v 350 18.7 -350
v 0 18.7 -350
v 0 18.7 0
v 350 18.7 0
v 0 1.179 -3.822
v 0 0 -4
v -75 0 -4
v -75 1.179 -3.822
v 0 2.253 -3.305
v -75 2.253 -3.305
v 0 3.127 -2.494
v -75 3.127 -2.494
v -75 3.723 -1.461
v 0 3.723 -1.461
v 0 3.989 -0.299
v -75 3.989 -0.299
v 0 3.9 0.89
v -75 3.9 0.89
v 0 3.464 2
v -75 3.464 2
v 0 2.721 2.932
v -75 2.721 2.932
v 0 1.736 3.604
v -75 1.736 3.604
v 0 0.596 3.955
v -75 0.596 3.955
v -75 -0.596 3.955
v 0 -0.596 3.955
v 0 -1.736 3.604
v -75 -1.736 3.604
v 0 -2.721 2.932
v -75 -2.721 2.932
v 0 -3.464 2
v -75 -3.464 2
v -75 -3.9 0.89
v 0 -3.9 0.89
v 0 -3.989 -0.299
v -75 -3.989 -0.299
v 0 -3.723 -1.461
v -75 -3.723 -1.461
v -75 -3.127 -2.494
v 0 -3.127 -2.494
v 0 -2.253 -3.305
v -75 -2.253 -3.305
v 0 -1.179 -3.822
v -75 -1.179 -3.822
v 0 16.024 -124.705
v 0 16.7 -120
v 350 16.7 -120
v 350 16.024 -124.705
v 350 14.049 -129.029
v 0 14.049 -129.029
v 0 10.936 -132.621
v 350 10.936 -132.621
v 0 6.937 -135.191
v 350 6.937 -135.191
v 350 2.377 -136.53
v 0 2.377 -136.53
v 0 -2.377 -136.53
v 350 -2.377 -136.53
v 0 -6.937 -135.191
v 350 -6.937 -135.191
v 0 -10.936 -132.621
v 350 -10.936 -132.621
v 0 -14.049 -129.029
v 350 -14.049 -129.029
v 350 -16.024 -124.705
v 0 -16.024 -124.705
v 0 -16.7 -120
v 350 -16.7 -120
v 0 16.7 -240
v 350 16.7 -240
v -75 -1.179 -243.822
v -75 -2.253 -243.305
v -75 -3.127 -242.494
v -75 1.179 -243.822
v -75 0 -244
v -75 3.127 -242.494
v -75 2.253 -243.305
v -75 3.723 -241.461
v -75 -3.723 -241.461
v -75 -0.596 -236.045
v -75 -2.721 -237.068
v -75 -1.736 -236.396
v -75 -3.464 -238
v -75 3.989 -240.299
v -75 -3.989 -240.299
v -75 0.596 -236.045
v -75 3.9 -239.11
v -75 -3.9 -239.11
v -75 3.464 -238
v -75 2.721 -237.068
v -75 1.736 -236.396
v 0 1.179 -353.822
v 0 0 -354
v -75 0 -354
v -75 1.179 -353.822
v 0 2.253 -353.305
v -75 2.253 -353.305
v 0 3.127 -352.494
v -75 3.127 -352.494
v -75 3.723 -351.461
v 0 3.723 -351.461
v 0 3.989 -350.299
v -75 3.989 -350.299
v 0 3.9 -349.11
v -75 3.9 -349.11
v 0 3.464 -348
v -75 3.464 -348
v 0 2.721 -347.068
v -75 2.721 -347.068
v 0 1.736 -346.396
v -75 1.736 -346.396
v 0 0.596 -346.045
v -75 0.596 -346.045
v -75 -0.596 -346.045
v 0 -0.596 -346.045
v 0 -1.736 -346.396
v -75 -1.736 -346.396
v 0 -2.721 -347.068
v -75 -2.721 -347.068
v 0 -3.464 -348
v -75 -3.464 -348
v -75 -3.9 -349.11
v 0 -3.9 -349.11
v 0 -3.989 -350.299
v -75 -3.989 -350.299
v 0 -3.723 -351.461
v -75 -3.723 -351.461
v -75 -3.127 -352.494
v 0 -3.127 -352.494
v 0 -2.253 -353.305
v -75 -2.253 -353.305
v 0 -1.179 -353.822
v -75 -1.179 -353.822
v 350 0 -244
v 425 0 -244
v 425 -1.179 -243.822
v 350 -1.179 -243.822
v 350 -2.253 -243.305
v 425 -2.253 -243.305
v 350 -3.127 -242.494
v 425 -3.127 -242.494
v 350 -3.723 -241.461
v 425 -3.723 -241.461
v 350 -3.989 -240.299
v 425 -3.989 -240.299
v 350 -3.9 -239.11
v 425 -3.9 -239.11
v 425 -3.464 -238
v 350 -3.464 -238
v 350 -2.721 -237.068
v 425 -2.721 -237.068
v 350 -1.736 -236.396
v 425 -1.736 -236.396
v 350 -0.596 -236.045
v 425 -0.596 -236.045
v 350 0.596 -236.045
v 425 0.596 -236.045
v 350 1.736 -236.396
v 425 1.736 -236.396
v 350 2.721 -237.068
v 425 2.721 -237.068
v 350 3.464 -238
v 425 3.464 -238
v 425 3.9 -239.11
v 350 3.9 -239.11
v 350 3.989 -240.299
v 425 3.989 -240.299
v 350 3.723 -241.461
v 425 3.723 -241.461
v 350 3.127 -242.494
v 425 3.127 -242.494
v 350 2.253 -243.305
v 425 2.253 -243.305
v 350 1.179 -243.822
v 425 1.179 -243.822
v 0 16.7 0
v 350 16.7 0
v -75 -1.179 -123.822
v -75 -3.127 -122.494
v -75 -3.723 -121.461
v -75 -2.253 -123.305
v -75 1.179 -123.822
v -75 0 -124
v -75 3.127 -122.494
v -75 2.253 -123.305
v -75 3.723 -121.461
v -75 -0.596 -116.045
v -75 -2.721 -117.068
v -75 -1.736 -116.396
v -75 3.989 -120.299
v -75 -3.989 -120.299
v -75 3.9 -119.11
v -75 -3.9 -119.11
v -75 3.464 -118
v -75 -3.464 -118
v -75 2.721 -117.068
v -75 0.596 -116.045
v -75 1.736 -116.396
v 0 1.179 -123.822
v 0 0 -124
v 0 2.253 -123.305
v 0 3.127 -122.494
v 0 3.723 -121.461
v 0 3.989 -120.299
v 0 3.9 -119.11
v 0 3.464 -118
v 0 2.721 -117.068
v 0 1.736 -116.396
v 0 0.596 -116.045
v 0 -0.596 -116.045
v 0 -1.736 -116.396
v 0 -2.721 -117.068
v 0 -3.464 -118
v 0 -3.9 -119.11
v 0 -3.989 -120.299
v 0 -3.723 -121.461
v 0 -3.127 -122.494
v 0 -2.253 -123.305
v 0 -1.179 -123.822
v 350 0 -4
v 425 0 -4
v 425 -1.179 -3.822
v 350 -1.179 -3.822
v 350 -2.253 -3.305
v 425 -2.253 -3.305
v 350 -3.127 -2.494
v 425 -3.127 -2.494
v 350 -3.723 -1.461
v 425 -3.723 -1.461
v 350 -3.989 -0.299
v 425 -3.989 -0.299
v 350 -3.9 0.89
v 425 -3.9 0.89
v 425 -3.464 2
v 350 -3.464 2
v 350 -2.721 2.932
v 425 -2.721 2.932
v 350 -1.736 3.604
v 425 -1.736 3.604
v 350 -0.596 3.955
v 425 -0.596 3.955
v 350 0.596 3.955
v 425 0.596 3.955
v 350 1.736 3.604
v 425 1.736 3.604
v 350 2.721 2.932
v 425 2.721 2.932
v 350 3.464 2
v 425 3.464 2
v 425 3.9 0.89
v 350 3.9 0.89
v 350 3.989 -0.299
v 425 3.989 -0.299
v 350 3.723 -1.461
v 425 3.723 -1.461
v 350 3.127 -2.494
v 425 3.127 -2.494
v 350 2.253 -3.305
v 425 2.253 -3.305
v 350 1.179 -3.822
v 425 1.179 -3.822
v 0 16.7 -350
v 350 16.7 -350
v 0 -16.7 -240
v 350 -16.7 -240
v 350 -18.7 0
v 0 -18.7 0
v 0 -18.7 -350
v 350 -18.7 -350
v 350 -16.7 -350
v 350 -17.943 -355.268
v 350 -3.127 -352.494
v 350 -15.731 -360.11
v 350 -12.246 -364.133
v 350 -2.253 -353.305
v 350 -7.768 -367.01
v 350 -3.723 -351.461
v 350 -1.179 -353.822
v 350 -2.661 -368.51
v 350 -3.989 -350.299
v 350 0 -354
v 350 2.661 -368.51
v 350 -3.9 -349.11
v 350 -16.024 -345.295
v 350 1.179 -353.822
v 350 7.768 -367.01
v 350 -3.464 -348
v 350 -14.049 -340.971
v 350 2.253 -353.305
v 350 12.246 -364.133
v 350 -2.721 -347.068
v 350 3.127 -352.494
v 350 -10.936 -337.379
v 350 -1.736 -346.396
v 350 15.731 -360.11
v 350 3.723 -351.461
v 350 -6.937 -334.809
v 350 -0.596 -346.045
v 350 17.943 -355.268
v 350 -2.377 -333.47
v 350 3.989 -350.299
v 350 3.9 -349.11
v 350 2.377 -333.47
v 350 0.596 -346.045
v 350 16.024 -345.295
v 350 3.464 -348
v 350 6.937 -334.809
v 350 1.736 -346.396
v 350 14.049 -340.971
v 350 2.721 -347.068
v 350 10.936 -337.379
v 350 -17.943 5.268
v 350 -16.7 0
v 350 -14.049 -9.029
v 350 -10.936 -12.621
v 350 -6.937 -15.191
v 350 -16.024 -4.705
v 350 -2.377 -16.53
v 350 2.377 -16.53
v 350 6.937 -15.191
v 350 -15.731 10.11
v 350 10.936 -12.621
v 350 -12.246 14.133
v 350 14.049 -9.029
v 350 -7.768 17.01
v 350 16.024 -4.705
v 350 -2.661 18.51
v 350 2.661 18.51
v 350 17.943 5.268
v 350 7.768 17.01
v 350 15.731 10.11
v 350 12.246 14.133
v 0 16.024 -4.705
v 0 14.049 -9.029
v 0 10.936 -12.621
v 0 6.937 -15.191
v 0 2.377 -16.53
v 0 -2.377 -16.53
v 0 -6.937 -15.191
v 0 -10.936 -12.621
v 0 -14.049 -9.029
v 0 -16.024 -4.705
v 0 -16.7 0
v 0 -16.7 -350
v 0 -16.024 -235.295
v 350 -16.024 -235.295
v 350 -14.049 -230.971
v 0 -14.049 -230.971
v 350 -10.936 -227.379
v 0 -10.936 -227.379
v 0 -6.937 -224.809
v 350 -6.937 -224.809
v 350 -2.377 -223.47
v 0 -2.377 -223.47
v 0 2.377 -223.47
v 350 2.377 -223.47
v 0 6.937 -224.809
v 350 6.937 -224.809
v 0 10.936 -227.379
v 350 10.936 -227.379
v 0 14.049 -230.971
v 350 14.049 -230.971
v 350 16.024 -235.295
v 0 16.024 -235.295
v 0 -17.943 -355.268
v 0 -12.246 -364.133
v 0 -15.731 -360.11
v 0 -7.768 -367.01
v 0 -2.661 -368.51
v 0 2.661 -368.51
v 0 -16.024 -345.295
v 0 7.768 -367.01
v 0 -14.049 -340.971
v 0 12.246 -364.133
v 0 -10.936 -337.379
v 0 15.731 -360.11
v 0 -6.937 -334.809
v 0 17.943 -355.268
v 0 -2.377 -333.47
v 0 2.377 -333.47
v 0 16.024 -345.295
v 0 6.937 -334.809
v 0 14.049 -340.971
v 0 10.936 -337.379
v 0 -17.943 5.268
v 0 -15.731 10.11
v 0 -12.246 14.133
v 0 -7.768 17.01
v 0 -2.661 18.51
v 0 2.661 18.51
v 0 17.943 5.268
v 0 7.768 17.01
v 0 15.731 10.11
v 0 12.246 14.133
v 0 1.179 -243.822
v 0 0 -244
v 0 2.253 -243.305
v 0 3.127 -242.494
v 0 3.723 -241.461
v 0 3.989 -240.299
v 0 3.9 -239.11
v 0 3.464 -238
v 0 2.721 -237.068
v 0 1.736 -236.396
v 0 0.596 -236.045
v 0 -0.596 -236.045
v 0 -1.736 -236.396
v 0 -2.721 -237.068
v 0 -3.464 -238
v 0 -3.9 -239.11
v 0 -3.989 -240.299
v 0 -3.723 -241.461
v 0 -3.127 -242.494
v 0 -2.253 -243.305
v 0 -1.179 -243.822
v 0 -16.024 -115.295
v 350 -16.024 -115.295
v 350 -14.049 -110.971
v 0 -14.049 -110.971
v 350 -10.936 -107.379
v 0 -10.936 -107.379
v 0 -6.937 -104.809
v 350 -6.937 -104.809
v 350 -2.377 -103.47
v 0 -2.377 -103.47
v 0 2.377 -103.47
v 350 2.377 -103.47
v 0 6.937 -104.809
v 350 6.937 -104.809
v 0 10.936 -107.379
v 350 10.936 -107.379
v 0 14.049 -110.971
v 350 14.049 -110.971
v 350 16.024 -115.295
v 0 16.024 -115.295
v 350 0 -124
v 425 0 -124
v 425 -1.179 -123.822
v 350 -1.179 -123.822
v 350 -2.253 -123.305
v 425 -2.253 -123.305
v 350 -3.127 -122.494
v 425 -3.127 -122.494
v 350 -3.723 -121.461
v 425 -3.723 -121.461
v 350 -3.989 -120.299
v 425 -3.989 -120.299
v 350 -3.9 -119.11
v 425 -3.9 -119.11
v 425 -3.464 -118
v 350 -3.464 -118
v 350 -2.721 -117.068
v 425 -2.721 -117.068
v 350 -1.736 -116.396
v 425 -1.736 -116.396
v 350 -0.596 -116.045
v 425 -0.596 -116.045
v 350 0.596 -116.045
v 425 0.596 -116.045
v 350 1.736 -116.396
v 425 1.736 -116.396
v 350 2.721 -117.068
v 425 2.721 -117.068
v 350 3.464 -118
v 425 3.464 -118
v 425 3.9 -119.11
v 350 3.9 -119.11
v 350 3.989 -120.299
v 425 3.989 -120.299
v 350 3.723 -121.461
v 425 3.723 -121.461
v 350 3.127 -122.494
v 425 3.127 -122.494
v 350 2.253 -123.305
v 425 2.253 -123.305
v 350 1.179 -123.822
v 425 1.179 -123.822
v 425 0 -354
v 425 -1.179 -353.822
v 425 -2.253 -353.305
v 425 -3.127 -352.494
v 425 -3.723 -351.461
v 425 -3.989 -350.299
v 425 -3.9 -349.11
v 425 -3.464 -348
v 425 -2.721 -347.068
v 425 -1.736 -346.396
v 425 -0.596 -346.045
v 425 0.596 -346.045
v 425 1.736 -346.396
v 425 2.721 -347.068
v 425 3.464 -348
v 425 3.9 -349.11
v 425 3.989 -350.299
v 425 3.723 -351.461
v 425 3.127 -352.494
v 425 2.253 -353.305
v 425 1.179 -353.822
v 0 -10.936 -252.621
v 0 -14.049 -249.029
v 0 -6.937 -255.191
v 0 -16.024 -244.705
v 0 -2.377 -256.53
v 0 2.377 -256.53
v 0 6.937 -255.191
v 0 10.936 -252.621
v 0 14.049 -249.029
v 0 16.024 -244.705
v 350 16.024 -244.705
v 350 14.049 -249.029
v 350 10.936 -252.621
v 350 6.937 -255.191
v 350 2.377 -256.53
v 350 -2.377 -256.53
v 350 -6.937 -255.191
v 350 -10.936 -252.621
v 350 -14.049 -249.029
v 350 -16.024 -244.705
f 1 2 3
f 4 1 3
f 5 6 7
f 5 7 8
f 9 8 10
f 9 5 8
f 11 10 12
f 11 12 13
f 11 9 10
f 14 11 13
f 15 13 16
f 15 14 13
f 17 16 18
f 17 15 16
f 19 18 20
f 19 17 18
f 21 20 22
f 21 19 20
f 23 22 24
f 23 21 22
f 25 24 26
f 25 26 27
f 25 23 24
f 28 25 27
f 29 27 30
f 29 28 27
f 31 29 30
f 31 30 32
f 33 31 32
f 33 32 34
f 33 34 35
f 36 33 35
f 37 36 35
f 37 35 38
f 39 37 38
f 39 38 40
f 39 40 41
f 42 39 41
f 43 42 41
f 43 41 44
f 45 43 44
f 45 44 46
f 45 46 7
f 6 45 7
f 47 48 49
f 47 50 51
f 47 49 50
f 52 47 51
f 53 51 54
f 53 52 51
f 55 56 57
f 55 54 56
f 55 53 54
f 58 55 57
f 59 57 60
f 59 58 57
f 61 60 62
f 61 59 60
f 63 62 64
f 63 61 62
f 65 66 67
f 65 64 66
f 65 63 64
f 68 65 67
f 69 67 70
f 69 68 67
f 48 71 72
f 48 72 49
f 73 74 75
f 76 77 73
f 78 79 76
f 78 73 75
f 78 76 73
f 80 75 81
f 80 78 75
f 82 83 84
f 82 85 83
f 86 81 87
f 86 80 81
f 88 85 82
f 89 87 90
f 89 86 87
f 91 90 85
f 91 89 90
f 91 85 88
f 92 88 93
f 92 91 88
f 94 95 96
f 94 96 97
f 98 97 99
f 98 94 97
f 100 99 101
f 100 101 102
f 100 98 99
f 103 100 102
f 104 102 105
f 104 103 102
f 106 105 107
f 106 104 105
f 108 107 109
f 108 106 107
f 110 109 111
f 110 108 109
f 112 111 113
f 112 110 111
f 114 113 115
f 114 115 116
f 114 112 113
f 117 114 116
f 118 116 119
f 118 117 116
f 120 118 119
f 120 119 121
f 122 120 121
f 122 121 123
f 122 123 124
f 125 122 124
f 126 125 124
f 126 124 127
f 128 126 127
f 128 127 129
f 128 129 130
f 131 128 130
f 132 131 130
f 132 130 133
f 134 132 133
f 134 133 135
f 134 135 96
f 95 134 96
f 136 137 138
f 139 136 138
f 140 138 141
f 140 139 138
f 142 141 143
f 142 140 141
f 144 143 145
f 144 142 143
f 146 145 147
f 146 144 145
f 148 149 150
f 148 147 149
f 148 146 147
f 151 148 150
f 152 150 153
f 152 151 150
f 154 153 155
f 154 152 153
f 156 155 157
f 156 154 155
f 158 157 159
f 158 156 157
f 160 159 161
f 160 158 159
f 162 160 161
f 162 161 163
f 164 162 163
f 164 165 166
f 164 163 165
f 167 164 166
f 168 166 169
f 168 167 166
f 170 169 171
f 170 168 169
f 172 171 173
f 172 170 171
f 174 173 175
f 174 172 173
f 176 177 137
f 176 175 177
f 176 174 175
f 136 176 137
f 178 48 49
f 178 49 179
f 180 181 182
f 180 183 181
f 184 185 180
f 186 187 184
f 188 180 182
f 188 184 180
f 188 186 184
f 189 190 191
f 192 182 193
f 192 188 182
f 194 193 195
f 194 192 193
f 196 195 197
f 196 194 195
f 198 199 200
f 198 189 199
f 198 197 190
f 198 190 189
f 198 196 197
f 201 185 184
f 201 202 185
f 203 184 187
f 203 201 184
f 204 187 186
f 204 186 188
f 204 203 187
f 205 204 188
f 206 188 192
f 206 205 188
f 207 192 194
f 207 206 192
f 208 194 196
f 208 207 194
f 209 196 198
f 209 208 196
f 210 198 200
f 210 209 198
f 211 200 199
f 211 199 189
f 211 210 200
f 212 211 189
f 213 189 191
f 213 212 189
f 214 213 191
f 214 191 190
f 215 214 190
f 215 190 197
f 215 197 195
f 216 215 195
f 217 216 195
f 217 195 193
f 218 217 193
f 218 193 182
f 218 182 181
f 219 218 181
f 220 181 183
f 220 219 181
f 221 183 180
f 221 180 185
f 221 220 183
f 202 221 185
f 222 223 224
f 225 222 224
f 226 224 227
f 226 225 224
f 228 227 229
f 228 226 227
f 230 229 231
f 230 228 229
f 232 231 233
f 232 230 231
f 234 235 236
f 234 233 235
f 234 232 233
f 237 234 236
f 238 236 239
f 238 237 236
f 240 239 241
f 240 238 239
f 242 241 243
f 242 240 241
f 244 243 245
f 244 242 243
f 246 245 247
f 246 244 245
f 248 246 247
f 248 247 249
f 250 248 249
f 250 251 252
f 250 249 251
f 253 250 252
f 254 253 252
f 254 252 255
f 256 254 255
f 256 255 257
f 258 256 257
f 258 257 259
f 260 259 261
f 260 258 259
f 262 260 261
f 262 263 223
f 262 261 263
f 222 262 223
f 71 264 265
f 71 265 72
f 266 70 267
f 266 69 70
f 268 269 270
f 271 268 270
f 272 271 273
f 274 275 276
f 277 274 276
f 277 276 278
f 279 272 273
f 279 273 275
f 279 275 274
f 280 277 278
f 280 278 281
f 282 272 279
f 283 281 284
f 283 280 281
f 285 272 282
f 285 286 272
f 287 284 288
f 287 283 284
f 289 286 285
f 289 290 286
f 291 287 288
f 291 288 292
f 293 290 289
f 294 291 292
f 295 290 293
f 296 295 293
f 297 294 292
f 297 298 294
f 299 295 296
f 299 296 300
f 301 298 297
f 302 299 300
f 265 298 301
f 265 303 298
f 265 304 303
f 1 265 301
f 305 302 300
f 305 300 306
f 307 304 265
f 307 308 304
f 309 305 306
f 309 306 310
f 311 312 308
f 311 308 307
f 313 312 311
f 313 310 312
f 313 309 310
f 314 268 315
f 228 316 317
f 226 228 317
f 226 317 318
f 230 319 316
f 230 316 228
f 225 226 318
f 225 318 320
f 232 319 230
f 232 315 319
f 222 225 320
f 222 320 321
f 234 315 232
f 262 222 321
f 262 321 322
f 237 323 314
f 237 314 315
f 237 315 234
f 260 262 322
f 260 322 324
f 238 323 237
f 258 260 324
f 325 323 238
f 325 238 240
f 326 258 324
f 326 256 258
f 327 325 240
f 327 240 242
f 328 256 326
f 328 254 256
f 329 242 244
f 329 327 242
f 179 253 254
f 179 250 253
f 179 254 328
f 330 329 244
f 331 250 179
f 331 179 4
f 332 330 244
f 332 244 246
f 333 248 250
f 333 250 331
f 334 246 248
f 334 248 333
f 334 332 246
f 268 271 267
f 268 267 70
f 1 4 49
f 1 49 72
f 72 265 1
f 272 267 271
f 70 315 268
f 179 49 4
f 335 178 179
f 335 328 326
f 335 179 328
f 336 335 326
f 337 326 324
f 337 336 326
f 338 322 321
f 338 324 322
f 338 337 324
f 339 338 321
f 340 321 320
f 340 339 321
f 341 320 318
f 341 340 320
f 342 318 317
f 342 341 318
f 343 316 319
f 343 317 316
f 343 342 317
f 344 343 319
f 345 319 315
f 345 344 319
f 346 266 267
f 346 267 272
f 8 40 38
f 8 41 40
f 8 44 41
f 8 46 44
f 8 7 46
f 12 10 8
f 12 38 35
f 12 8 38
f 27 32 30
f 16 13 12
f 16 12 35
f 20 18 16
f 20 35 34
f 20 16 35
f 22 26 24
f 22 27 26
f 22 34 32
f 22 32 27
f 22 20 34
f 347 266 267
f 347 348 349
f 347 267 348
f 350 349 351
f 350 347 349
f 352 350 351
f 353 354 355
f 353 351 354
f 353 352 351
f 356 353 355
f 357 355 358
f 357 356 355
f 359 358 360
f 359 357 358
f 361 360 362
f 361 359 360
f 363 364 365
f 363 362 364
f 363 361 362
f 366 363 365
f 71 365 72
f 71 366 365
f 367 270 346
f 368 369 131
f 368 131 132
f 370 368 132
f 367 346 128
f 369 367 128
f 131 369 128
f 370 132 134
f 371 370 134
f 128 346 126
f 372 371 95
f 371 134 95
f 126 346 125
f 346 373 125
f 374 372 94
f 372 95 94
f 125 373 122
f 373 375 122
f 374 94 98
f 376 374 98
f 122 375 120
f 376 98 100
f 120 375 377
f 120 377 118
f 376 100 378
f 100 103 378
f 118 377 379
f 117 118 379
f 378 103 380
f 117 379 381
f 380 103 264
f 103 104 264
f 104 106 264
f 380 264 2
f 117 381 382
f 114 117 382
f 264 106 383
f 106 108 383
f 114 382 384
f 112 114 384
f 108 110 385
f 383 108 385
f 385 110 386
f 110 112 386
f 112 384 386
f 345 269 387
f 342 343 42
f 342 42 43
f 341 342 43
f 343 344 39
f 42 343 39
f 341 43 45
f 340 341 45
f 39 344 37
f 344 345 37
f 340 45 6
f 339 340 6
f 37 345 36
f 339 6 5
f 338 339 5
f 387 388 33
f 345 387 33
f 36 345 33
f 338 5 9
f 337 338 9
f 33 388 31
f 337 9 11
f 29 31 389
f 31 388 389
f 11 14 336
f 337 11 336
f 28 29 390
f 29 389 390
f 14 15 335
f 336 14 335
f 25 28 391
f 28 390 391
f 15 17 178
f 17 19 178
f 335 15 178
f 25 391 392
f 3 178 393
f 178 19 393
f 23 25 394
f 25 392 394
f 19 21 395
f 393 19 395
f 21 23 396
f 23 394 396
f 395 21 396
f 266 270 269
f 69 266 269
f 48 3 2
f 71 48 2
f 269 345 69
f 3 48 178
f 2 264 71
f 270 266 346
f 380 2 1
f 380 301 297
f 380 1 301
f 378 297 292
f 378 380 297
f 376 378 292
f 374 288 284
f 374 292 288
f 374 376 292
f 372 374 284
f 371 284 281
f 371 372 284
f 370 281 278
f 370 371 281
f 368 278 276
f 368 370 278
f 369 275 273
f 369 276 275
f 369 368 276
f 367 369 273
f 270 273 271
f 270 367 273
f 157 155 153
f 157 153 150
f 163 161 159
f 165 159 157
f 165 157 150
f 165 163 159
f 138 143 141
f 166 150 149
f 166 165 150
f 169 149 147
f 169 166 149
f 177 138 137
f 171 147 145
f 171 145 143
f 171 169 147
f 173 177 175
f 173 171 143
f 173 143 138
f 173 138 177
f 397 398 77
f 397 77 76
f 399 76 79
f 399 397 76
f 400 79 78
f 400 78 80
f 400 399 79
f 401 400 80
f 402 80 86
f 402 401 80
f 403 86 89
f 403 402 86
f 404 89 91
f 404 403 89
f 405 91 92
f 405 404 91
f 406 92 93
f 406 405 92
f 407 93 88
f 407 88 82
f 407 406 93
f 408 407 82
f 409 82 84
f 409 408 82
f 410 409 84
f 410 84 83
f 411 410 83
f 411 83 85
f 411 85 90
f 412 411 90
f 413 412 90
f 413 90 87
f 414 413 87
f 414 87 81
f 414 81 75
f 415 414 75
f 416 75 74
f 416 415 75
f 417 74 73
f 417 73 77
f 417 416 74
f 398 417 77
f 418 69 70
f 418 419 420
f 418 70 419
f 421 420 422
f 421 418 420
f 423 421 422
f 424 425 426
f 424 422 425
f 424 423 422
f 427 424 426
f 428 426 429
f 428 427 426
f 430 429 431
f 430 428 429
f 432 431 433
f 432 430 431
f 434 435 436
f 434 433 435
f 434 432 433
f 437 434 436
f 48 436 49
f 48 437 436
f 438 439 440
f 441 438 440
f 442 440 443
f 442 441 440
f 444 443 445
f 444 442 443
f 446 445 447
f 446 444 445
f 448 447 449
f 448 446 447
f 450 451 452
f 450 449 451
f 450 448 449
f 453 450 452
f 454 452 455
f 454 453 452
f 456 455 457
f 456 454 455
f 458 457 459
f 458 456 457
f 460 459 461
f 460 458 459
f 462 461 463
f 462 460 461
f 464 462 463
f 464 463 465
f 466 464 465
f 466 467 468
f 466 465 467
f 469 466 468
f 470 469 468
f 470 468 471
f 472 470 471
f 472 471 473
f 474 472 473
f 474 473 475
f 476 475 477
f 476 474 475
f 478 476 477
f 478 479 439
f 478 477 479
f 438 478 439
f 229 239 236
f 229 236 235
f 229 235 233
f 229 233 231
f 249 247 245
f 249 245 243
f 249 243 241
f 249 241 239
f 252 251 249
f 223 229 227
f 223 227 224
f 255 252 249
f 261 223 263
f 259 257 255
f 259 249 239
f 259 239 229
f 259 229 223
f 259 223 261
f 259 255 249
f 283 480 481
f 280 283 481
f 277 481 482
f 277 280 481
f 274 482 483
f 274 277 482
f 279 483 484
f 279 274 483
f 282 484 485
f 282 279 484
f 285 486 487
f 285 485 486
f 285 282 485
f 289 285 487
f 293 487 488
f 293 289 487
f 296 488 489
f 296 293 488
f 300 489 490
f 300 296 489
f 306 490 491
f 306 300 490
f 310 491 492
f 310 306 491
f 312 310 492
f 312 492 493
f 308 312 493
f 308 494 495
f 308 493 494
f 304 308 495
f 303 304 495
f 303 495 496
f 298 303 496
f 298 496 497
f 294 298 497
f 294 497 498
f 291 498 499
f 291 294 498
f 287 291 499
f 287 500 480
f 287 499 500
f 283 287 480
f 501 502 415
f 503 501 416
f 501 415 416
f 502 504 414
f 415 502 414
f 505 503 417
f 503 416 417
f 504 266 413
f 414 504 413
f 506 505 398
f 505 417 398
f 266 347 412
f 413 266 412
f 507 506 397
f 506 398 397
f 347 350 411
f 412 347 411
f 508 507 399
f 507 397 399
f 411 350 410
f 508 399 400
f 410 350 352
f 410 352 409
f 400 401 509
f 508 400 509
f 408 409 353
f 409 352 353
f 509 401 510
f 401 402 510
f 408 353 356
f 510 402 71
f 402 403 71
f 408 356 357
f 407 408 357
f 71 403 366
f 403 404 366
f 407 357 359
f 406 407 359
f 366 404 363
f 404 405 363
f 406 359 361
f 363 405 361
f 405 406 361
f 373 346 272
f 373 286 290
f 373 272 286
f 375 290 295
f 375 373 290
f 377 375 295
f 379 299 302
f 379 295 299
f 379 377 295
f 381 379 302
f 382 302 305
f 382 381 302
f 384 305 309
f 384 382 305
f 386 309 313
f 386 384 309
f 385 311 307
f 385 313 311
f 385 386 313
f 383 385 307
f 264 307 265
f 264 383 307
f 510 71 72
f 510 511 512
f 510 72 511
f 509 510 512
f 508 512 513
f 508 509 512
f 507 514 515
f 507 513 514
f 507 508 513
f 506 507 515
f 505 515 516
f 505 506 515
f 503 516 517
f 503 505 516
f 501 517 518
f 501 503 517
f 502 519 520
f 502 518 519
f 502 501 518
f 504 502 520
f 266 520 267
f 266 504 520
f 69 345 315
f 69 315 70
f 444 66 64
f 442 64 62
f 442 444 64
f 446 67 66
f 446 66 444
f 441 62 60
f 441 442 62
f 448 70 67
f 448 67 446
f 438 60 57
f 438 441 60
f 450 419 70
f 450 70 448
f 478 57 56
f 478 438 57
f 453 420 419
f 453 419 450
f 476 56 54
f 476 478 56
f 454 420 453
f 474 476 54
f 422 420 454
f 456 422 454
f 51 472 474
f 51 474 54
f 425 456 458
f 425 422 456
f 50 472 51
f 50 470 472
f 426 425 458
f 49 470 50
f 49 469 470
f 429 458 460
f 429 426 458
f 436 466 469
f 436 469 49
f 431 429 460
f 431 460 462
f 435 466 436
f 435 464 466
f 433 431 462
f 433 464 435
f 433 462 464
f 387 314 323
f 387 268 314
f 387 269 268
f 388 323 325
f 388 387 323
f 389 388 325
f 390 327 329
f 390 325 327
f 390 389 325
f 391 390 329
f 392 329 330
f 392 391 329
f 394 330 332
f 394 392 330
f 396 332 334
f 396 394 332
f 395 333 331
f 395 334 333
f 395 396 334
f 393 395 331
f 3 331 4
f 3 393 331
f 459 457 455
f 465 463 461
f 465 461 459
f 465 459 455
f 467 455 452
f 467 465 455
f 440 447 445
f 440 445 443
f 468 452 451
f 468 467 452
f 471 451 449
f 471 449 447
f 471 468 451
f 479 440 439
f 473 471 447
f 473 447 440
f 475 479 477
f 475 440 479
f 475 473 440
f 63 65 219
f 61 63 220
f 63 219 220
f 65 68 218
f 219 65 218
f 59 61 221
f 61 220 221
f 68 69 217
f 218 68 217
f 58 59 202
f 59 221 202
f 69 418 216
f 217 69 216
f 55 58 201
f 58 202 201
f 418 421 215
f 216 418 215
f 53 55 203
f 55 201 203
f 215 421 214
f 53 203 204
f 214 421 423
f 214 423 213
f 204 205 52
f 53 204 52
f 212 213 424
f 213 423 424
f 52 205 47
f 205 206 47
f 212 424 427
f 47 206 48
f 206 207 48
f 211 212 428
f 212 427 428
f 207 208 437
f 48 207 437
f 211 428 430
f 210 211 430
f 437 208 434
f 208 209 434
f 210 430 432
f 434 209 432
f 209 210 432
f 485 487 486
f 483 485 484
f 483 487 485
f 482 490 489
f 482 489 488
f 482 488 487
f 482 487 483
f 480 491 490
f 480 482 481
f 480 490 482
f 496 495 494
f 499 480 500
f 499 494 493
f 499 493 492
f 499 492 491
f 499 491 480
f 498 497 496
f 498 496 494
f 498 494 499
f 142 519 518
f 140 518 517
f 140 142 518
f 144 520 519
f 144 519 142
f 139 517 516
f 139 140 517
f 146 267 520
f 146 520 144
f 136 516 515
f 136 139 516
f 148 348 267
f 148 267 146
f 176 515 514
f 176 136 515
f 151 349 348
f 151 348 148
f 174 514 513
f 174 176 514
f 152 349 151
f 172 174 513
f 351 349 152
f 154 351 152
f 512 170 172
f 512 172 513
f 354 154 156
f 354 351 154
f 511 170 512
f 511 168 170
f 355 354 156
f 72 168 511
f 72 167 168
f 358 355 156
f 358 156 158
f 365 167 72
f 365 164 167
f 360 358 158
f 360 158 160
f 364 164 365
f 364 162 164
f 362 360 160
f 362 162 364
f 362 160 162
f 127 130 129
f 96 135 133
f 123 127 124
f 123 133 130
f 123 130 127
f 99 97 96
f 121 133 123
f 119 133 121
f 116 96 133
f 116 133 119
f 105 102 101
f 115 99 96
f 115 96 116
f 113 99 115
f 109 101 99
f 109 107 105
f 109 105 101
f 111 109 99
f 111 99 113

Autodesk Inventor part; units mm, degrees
ref_plane "YZ Plane" through (0, 0, 0) normal (1, 0, 0) x (0, 1, 0)
ref_plane "XZ Plane" through (0, 0, 0) normal (0, 1, 0) x (-1, 0, 0)
sketch "Sketch1" plane through (0, 0, 0) normal (1, 0, 0) x (0, 1, 0)
  line L0 (0, 0) -> (0, -350) construction
  line L1 (0, 0) -> (0, -350) construction
  line L2 (-16.7, 0) -> (-16.7, -350)
  line L3 (16.7, -350) -> (16.7, 0)
  arc A0 (16.7, 0) -> (-16.7, 0) centre (0, 0) ccw
  arc A1 (-16.7, -350) -> (16.7, -350) centre (0, -350) ccw
  line L4 (0, 0) -> (0, -350) construction
  line L5 (-18.7, 0) -> (-18.7, -350)
  line L6 (18.7, -350) -> (18.7, 0)
  arc A2 (18.7, 0) -> (-18.7, 0) centre (0, 0) ccw
  arc A3 (-18.7, -350) -> (18.7, -350) centre (0, -350) ccw
  circle A4 centre (0, 0) radius 16.7
  circle A5 centre (0, -350) radius 16.7
  line L7 (0, 0) -> (0, -120) construction
  line L8 (0, -120) -> (0, -240) construction
  circle A6 centre (0, -120) radius 16.7
  circle A7 centre (0, -240) radius 16.7
  point P0 (0, -175)
  point P1 (0, -175)
  point P2 (-16.7, -240)
  point P3 (-16.7, -120)
  point P4 (16.7, 0)
  point P5 (16.7, -120)
  point P6 (16.7, -240)
  point P7 (16.7, -350)
  dimension "d0" = 350
  dimension "d1" = 33.4
  dimension "d8" = 37.4
  dimension "d9" = 120
  dimension "d10" = 120
extrude "Extrusion1" add sketch "Sketch1" along normal blind 350 contours A0 A4 | A6 | A7 | A5 A1 | A2 L6 A3 L5
sketch "Sketch2" plane through (350, 0, 0) normal (1, 0, 0) x (0, 0, -1)
  arc A0 (350, -16.7) -> (350, 25) centre (350, 0) ccw projected
  circle A1 centre (350, 0) radius 4
  circle A2 centre (240, 0) radius 4
  arc A3 (120, -16.7) -> (120, 16.7) centre (120, 0) ccw projected
  circle A4 centre (120, 0) radius 4
  arc A5 (0, -16.7) -> (0, 16.7) centre (0, 0) ccw projected
  circle A6 centre (0, 0) radius 4
  dimension "d7" = 8
extrude "Extrusion2" add sketch "Sketch2" along normal blind 75
ref_plane "Work Plane1" through (175, 0, 0) normal (-1, 0, 0) x (0, 0, 1)
mirror "Mirror1" about plane through (175, 0, 0) normal (-1, 0, 0) of "Extrusion2"
properties part number "Conveyor"
